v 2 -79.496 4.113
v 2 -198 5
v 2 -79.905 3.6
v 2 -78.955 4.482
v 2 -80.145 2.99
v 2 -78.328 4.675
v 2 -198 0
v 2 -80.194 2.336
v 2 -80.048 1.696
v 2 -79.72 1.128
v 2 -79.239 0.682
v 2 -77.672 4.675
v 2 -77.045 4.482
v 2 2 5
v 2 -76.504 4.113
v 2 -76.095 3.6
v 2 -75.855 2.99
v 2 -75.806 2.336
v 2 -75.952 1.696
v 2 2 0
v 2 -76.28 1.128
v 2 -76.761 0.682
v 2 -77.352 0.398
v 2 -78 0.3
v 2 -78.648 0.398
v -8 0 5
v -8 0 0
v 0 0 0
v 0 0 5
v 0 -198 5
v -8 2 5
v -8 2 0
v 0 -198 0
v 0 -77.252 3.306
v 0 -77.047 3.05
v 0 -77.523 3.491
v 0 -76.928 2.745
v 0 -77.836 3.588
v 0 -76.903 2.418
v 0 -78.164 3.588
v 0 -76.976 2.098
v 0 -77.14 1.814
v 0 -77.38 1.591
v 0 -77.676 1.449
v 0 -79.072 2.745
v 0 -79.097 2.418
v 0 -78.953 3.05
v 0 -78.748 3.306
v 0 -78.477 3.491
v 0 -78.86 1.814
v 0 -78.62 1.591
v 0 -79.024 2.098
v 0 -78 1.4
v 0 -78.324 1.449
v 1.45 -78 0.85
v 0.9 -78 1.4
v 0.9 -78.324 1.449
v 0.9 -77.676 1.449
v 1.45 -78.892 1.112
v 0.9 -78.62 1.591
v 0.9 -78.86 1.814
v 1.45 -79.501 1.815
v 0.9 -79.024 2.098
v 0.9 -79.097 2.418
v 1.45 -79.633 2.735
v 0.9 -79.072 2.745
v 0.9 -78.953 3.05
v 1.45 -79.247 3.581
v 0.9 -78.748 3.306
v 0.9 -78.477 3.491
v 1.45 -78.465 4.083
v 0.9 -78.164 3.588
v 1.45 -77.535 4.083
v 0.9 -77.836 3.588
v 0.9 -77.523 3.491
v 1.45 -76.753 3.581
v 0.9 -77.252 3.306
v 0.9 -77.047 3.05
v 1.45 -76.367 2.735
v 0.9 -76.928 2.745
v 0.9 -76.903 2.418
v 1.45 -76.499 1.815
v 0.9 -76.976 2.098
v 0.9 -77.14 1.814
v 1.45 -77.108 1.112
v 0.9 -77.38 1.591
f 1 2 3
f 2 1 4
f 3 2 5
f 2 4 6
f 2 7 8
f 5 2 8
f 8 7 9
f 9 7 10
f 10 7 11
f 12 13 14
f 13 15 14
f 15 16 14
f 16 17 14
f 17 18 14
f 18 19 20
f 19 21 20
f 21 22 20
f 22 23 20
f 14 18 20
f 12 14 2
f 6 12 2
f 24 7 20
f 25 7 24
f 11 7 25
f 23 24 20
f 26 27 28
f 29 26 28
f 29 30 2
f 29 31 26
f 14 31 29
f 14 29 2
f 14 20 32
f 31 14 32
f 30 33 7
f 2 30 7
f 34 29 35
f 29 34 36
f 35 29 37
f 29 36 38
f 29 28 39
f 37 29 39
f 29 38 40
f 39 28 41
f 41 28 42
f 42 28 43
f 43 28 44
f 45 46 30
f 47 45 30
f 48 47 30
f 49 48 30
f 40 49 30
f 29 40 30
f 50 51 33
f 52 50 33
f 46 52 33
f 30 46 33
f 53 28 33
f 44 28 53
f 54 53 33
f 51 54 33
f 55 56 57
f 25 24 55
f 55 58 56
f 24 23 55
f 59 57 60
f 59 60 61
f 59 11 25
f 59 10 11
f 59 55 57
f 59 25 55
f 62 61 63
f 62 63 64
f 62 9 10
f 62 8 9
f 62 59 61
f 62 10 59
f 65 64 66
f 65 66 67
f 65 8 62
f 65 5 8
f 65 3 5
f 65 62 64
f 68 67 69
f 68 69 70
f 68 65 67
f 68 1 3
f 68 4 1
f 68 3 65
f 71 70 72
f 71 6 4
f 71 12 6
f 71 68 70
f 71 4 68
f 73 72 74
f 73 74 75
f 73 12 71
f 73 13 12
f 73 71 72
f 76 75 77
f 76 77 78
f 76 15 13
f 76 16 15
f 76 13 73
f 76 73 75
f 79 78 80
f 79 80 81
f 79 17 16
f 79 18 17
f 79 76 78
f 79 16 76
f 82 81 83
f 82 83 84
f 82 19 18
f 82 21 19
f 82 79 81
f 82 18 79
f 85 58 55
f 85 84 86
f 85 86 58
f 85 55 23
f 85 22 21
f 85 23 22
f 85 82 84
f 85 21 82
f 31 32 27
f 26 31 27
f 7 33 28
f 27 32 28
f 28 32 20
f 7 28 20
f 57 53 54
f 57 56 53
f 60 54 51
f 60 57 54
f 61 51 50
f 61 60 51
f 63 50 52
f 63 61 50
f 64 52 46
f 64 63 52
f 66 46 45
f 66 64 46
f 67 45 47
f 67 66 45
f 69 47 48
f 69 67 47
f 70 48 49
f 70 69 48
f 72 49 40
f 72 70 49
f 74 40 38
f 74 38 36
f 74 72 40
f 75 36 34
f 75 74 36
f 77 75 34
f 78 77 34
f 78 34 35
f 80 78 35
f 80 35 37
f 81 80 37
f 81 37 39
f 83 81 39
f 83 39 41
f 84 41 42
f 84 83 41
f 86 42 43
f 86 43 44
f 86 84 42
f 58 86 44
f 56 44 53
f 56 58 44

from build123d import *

# Parameters (mm, degrees)
BOSS_EXTRUDE1_DEPTH = 5


with BuildPart() as part:
    # Sketch1 → Boss-Extrude1 (new body)
    with BuildSketch(Plane.XY):
        Polygon((-8, 0), (0, 0), (0, -198), (2, -198), (2, 2), (-8, 2), align=None)
    extrude(amount=BOSS_EXTRUDE1_DEPTH)

    # Sketch3 → CSK for M2 Flat Head Machine Screw1 (revolve, cut)
    with BuildSketch(Plane(origin=(2, -78, 2.5), x_dir=(0, 0, -1), z_dir=(0, 1, 0))):
        Polygon((0, 0), (0, 2), (1.1, 2), (1.1, 1.1), (2.2, 0), align=None)
    revolve(axis=Axis((8.35, -78, 2.5), (-1, 0, 0)), mode=Mode.SUBTRACT)


solid = part.part
